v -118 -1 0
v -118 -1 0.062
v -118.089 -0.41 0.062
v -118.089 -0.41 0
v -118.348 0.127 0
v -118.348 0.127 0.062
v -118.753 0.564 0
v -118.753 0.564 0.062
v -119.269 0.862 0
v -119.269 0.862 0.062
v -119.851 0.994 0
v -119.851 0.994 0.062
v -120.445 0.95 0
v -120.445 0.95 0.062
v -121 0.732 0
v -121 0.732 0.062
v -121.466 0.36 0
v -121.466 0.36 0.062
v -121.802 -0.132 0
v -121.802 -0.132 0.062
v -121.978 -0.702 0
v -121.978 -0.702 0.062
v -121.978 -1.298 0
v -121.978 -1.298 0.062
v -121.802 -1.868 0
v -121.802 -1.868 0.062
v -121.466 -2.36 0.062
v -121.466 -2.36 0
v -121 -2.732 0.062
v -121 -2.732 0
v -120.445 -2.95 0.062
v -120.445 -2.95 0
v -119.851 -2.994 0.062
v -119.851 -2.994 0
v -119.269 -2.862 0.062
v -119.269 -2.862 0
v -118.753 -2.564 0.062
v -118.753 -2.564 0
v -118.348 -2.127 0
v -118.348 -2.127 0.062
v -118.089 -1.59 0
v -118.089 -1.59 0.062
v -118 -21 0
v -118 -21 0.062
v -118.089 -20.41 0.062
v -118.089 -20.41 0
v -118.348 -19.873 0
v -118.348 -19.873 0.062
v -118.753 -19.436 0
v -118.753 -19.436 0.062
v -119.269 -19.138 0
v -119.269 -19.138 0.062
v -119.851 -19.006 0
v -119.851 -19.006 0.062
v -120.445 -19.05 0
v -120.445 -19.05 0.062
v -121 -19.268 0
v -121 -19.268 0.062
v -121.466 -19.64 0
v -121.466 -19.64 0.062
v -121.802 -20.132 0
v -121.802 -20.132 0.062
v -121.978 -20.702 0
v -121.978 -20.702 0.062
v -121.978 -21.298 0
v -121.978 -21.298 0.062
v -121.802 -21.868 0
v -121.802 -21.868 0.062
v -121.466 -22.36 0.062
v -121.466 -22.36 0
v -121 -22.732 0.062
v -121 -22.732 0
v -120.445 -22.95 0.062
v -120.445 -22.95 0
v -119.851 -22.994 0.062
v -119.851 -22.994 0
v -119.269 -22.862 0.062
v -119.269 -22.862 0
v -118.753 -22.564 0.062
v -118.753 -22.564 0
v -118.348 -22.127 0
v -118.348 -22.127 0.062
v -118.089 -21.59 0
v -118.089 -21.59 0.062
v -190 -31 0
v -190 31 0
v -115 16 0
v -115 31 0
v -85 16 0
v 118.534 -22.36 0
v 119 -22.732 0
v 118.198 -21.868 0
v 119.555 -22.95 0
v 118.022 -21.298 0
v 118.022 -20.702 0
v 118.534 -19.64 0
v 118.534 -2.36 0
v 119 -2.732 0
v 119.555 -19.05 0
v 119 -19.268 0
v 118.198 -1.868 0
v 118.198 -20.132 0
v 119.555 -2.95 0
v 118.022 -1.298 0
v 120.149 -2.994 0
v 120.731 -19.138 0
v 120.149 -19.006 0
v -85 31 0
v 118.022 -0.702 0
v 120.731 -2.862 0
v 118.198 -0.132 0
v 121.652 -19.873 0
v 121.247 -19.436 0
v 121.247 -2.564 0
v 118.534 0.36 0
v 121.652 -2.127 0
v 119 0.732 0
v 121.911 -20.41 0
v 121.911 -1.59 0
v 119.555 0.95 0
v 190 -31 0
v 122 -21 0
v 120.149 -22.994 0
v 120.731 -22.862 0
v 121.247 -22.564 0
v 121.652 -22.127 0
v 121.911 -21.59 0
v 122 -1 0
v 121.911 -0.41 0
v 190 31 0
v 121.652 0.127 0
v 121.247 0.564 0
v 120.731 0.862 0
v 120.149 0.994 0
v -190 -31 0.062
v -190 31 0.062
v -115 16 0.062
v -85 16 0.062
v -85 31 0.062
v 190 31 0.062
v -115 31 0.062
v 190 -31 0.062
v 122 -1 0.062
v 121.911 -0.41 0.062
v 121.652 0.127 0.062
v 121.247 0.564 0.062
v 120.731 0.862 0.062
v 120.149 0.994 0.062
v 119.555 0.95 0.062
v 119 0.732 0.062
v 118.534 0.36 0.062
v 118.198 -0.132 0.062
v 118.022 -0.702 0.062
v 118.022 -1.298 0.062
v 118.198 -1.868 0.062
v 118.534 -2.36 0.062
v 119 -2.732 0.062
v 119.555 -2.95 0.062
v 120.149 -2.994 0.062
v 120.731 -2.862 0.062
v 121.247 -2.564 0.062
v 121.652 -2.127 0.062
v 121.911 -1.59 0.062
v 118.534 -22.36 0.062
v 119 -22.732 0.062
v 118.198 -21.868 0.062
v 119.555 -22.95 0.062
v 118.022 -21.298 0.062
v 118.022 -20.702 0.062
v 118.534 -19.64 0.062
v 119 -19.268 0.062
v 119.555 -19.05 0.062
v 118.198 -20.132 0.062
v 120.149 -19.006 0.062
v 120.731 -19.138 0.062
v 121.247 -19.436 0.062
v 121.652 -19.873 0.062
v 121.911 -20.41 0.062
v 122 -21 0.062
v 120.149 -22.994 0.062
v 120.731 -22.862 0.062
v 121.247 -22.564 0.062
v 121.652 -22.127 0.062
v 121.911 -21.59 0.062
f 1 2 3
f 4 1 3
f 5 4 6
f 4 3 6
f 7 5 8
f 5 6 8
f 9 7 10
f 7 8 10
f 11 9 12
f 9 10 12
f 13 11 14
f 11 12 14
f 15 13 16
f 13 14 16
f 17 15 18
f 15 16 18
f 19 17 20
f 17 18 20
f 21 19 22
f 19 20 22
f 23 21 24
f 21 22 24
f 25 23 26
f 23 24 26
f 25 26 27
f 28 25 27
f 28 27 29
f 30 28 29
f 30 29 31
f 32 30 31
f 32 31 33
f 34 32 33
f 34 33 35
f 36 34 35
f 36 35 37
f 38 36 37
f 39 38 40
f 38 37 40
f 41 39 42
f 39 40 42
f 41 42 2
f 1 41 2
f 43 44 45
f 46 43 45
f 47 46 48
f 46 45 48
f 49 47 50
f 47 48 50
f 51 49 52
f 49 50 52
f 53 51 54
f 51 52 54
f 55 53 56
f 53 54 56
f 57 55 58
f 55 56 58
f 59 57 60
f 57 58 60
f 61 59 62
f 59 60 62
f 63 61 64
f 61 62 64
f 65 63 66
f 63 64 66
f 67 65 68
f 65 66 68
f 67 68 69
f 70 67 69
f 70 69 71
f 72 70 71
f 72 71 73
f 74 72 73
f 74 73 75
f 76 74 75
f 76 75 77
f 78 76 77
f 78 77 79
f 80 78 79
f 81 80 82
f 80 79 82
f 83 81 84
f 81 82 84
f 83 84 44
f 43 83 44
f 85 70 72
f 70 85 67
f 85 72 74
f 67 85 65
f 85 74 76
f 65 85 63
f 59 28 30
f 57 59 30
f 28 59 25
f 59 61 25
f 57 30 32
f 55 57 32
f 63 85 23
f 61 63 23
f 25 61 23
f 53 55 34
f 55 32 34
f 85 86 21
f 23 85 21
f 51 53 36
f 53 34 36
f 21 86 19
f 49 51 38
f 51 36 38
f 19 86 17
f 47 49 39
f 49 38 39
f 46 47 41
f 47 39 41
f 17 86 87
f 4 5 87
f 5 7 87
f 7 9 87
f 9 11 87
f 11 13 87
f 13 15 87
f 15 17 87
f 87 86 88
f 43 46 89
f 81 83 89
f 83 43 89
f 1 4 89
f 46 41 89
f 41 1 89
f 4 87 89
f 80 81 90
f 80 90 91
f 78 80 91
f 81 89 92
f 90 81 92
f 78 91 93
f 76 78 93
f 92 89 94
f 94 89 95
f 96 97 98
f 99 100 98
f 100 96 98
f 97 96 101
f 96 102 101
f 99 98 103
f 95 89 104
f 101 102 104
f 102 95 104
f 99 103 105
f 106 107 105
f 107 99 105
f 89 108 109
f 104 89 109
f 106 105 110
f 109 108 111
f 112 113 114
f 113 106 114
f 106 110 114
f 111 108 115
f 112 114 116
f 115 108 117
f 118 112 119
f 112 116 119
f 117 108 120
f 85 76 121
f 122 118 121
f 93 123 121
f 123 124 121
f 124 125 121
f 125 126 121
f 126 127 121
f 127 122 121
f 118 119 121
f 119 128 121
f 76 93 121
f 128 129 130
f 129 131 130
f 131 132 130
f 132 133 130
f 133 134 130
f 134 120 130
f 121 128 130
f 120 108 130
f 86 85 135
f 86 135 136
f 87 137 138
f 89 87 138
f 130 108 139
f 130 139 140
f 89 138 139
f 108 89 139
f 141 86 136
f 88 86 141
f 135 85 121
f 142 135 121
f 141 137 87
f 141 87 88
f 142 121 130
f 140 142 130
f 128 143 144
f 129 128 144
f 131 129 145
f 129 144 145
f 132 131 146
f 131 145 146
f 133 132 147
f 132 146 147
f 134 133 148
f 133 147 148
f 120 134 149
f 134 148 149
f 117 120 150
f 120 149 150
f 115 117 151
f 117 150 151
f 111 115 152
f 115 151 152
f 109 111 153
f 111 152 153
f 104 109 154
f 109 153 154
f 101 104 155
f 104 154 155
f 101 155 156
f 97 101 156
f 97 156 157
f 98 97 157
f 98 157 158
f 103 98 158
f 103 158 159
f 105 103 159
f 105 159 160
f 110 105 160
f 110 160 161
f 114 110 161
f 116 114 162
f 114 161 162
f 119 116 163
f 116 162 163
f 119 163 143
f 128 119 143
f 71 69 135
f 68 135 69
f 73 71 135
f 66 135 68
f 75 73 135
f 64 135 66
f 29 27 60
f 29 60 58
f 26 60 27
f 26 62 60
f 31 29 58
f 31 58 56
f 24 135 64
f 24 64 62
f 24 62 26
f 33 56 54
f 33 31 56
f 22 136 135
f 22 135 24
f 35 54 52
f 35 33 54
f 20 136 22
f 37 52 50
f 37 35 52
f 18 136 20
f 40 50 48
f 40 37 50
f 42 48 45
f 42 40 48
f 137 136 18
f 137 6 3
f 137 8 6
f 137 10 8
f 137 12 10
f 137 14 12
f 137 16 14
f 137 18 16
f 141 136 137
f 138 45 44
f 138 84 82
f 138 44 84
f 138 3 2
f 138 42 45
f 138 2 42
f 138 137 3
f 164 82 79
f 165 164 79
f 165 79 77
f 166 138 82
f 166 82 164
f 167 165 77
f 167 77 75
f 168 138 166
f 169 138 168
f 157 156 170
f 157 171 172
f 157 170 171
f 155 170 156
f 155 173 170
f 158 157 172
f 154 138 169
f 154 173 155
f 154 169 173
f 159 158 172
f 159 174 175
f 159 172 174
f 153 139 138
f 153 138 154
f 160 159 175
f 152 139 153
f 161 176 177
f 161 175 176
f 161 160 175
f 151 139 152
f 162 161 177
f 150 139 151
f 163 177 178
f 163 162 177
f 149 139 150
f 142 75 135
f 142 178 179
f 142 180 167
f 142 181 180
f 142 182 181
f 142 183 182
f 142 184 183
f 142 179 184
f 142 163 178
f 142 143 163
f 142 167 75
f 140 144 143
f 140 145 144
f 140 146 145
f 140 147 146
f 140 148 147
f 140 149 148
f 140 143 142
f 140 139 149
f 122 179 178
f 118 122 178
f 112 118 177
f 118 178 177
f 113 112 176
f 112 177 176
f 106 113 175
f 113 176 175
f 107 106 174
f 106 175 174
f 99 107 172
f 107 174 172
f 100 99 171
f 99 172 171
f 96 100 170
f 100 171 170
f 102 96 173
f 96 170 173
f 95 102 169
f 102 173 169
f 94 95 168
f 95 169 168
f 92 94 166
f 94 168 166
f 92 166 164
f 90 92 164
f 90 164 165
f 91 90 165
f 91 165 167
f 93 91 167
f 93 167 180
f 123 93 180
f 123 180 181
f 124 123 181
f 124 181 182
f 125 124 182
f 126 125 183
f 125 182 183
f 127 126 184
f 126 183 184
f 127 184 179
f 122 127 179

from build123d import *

# Parameters (mm, degrees)
SKETCH1_W             = 380
SKETCH1_H             = 62
BODY_DEPTH            = 0.0625
SKETCH2_R             = 2
MAGNETIC_HOLDER_DEPTH = 0.0625
SKETCH3_W             = 30
SKETCH3_H             = 15
CUT_EXTRUDE2_DEPTH    = 0.0625


with BuildPart() as part:
    # Sketch1 → Body (new body)
    with BuildSketch(Plane.XY):
        Rectangle(SKETCH1_W, SKETCH1_H)
    extrude(amount=BODY_DEPTH)

    # Sketch2 → Magnetic Holder (cut)
    with BuildSketch(Plane.XY.offset(0.0625)):
        with Locations((-120, -1)):
            Circle(SKETCH2_R)
        with Locations((120, -1)):
            Circle(SKETCH2_R)
        with Locations((120, -21)):
            Circle(SKETCH2_R)
        with Locations((-120, -21)):
            Circle(SKETCH2_R)
    extrude(amount=-MAGNETIC_HOLDER_DEPTH, mode=Mode.SUBTRACT)

    # Sketch3 → Cut-Extrude2 (cut)
    with BuildSketch(Plane.XY.offset(0.0625)):
        with Locations((-100, 23.5)):
            Rectangle(SKETCH3_W, SKETCH3_H)
    extrude(amount=-CUT_EXTRUDE2_DEPTH, mode=Mode.SUBTRACT)


solid = part.part
